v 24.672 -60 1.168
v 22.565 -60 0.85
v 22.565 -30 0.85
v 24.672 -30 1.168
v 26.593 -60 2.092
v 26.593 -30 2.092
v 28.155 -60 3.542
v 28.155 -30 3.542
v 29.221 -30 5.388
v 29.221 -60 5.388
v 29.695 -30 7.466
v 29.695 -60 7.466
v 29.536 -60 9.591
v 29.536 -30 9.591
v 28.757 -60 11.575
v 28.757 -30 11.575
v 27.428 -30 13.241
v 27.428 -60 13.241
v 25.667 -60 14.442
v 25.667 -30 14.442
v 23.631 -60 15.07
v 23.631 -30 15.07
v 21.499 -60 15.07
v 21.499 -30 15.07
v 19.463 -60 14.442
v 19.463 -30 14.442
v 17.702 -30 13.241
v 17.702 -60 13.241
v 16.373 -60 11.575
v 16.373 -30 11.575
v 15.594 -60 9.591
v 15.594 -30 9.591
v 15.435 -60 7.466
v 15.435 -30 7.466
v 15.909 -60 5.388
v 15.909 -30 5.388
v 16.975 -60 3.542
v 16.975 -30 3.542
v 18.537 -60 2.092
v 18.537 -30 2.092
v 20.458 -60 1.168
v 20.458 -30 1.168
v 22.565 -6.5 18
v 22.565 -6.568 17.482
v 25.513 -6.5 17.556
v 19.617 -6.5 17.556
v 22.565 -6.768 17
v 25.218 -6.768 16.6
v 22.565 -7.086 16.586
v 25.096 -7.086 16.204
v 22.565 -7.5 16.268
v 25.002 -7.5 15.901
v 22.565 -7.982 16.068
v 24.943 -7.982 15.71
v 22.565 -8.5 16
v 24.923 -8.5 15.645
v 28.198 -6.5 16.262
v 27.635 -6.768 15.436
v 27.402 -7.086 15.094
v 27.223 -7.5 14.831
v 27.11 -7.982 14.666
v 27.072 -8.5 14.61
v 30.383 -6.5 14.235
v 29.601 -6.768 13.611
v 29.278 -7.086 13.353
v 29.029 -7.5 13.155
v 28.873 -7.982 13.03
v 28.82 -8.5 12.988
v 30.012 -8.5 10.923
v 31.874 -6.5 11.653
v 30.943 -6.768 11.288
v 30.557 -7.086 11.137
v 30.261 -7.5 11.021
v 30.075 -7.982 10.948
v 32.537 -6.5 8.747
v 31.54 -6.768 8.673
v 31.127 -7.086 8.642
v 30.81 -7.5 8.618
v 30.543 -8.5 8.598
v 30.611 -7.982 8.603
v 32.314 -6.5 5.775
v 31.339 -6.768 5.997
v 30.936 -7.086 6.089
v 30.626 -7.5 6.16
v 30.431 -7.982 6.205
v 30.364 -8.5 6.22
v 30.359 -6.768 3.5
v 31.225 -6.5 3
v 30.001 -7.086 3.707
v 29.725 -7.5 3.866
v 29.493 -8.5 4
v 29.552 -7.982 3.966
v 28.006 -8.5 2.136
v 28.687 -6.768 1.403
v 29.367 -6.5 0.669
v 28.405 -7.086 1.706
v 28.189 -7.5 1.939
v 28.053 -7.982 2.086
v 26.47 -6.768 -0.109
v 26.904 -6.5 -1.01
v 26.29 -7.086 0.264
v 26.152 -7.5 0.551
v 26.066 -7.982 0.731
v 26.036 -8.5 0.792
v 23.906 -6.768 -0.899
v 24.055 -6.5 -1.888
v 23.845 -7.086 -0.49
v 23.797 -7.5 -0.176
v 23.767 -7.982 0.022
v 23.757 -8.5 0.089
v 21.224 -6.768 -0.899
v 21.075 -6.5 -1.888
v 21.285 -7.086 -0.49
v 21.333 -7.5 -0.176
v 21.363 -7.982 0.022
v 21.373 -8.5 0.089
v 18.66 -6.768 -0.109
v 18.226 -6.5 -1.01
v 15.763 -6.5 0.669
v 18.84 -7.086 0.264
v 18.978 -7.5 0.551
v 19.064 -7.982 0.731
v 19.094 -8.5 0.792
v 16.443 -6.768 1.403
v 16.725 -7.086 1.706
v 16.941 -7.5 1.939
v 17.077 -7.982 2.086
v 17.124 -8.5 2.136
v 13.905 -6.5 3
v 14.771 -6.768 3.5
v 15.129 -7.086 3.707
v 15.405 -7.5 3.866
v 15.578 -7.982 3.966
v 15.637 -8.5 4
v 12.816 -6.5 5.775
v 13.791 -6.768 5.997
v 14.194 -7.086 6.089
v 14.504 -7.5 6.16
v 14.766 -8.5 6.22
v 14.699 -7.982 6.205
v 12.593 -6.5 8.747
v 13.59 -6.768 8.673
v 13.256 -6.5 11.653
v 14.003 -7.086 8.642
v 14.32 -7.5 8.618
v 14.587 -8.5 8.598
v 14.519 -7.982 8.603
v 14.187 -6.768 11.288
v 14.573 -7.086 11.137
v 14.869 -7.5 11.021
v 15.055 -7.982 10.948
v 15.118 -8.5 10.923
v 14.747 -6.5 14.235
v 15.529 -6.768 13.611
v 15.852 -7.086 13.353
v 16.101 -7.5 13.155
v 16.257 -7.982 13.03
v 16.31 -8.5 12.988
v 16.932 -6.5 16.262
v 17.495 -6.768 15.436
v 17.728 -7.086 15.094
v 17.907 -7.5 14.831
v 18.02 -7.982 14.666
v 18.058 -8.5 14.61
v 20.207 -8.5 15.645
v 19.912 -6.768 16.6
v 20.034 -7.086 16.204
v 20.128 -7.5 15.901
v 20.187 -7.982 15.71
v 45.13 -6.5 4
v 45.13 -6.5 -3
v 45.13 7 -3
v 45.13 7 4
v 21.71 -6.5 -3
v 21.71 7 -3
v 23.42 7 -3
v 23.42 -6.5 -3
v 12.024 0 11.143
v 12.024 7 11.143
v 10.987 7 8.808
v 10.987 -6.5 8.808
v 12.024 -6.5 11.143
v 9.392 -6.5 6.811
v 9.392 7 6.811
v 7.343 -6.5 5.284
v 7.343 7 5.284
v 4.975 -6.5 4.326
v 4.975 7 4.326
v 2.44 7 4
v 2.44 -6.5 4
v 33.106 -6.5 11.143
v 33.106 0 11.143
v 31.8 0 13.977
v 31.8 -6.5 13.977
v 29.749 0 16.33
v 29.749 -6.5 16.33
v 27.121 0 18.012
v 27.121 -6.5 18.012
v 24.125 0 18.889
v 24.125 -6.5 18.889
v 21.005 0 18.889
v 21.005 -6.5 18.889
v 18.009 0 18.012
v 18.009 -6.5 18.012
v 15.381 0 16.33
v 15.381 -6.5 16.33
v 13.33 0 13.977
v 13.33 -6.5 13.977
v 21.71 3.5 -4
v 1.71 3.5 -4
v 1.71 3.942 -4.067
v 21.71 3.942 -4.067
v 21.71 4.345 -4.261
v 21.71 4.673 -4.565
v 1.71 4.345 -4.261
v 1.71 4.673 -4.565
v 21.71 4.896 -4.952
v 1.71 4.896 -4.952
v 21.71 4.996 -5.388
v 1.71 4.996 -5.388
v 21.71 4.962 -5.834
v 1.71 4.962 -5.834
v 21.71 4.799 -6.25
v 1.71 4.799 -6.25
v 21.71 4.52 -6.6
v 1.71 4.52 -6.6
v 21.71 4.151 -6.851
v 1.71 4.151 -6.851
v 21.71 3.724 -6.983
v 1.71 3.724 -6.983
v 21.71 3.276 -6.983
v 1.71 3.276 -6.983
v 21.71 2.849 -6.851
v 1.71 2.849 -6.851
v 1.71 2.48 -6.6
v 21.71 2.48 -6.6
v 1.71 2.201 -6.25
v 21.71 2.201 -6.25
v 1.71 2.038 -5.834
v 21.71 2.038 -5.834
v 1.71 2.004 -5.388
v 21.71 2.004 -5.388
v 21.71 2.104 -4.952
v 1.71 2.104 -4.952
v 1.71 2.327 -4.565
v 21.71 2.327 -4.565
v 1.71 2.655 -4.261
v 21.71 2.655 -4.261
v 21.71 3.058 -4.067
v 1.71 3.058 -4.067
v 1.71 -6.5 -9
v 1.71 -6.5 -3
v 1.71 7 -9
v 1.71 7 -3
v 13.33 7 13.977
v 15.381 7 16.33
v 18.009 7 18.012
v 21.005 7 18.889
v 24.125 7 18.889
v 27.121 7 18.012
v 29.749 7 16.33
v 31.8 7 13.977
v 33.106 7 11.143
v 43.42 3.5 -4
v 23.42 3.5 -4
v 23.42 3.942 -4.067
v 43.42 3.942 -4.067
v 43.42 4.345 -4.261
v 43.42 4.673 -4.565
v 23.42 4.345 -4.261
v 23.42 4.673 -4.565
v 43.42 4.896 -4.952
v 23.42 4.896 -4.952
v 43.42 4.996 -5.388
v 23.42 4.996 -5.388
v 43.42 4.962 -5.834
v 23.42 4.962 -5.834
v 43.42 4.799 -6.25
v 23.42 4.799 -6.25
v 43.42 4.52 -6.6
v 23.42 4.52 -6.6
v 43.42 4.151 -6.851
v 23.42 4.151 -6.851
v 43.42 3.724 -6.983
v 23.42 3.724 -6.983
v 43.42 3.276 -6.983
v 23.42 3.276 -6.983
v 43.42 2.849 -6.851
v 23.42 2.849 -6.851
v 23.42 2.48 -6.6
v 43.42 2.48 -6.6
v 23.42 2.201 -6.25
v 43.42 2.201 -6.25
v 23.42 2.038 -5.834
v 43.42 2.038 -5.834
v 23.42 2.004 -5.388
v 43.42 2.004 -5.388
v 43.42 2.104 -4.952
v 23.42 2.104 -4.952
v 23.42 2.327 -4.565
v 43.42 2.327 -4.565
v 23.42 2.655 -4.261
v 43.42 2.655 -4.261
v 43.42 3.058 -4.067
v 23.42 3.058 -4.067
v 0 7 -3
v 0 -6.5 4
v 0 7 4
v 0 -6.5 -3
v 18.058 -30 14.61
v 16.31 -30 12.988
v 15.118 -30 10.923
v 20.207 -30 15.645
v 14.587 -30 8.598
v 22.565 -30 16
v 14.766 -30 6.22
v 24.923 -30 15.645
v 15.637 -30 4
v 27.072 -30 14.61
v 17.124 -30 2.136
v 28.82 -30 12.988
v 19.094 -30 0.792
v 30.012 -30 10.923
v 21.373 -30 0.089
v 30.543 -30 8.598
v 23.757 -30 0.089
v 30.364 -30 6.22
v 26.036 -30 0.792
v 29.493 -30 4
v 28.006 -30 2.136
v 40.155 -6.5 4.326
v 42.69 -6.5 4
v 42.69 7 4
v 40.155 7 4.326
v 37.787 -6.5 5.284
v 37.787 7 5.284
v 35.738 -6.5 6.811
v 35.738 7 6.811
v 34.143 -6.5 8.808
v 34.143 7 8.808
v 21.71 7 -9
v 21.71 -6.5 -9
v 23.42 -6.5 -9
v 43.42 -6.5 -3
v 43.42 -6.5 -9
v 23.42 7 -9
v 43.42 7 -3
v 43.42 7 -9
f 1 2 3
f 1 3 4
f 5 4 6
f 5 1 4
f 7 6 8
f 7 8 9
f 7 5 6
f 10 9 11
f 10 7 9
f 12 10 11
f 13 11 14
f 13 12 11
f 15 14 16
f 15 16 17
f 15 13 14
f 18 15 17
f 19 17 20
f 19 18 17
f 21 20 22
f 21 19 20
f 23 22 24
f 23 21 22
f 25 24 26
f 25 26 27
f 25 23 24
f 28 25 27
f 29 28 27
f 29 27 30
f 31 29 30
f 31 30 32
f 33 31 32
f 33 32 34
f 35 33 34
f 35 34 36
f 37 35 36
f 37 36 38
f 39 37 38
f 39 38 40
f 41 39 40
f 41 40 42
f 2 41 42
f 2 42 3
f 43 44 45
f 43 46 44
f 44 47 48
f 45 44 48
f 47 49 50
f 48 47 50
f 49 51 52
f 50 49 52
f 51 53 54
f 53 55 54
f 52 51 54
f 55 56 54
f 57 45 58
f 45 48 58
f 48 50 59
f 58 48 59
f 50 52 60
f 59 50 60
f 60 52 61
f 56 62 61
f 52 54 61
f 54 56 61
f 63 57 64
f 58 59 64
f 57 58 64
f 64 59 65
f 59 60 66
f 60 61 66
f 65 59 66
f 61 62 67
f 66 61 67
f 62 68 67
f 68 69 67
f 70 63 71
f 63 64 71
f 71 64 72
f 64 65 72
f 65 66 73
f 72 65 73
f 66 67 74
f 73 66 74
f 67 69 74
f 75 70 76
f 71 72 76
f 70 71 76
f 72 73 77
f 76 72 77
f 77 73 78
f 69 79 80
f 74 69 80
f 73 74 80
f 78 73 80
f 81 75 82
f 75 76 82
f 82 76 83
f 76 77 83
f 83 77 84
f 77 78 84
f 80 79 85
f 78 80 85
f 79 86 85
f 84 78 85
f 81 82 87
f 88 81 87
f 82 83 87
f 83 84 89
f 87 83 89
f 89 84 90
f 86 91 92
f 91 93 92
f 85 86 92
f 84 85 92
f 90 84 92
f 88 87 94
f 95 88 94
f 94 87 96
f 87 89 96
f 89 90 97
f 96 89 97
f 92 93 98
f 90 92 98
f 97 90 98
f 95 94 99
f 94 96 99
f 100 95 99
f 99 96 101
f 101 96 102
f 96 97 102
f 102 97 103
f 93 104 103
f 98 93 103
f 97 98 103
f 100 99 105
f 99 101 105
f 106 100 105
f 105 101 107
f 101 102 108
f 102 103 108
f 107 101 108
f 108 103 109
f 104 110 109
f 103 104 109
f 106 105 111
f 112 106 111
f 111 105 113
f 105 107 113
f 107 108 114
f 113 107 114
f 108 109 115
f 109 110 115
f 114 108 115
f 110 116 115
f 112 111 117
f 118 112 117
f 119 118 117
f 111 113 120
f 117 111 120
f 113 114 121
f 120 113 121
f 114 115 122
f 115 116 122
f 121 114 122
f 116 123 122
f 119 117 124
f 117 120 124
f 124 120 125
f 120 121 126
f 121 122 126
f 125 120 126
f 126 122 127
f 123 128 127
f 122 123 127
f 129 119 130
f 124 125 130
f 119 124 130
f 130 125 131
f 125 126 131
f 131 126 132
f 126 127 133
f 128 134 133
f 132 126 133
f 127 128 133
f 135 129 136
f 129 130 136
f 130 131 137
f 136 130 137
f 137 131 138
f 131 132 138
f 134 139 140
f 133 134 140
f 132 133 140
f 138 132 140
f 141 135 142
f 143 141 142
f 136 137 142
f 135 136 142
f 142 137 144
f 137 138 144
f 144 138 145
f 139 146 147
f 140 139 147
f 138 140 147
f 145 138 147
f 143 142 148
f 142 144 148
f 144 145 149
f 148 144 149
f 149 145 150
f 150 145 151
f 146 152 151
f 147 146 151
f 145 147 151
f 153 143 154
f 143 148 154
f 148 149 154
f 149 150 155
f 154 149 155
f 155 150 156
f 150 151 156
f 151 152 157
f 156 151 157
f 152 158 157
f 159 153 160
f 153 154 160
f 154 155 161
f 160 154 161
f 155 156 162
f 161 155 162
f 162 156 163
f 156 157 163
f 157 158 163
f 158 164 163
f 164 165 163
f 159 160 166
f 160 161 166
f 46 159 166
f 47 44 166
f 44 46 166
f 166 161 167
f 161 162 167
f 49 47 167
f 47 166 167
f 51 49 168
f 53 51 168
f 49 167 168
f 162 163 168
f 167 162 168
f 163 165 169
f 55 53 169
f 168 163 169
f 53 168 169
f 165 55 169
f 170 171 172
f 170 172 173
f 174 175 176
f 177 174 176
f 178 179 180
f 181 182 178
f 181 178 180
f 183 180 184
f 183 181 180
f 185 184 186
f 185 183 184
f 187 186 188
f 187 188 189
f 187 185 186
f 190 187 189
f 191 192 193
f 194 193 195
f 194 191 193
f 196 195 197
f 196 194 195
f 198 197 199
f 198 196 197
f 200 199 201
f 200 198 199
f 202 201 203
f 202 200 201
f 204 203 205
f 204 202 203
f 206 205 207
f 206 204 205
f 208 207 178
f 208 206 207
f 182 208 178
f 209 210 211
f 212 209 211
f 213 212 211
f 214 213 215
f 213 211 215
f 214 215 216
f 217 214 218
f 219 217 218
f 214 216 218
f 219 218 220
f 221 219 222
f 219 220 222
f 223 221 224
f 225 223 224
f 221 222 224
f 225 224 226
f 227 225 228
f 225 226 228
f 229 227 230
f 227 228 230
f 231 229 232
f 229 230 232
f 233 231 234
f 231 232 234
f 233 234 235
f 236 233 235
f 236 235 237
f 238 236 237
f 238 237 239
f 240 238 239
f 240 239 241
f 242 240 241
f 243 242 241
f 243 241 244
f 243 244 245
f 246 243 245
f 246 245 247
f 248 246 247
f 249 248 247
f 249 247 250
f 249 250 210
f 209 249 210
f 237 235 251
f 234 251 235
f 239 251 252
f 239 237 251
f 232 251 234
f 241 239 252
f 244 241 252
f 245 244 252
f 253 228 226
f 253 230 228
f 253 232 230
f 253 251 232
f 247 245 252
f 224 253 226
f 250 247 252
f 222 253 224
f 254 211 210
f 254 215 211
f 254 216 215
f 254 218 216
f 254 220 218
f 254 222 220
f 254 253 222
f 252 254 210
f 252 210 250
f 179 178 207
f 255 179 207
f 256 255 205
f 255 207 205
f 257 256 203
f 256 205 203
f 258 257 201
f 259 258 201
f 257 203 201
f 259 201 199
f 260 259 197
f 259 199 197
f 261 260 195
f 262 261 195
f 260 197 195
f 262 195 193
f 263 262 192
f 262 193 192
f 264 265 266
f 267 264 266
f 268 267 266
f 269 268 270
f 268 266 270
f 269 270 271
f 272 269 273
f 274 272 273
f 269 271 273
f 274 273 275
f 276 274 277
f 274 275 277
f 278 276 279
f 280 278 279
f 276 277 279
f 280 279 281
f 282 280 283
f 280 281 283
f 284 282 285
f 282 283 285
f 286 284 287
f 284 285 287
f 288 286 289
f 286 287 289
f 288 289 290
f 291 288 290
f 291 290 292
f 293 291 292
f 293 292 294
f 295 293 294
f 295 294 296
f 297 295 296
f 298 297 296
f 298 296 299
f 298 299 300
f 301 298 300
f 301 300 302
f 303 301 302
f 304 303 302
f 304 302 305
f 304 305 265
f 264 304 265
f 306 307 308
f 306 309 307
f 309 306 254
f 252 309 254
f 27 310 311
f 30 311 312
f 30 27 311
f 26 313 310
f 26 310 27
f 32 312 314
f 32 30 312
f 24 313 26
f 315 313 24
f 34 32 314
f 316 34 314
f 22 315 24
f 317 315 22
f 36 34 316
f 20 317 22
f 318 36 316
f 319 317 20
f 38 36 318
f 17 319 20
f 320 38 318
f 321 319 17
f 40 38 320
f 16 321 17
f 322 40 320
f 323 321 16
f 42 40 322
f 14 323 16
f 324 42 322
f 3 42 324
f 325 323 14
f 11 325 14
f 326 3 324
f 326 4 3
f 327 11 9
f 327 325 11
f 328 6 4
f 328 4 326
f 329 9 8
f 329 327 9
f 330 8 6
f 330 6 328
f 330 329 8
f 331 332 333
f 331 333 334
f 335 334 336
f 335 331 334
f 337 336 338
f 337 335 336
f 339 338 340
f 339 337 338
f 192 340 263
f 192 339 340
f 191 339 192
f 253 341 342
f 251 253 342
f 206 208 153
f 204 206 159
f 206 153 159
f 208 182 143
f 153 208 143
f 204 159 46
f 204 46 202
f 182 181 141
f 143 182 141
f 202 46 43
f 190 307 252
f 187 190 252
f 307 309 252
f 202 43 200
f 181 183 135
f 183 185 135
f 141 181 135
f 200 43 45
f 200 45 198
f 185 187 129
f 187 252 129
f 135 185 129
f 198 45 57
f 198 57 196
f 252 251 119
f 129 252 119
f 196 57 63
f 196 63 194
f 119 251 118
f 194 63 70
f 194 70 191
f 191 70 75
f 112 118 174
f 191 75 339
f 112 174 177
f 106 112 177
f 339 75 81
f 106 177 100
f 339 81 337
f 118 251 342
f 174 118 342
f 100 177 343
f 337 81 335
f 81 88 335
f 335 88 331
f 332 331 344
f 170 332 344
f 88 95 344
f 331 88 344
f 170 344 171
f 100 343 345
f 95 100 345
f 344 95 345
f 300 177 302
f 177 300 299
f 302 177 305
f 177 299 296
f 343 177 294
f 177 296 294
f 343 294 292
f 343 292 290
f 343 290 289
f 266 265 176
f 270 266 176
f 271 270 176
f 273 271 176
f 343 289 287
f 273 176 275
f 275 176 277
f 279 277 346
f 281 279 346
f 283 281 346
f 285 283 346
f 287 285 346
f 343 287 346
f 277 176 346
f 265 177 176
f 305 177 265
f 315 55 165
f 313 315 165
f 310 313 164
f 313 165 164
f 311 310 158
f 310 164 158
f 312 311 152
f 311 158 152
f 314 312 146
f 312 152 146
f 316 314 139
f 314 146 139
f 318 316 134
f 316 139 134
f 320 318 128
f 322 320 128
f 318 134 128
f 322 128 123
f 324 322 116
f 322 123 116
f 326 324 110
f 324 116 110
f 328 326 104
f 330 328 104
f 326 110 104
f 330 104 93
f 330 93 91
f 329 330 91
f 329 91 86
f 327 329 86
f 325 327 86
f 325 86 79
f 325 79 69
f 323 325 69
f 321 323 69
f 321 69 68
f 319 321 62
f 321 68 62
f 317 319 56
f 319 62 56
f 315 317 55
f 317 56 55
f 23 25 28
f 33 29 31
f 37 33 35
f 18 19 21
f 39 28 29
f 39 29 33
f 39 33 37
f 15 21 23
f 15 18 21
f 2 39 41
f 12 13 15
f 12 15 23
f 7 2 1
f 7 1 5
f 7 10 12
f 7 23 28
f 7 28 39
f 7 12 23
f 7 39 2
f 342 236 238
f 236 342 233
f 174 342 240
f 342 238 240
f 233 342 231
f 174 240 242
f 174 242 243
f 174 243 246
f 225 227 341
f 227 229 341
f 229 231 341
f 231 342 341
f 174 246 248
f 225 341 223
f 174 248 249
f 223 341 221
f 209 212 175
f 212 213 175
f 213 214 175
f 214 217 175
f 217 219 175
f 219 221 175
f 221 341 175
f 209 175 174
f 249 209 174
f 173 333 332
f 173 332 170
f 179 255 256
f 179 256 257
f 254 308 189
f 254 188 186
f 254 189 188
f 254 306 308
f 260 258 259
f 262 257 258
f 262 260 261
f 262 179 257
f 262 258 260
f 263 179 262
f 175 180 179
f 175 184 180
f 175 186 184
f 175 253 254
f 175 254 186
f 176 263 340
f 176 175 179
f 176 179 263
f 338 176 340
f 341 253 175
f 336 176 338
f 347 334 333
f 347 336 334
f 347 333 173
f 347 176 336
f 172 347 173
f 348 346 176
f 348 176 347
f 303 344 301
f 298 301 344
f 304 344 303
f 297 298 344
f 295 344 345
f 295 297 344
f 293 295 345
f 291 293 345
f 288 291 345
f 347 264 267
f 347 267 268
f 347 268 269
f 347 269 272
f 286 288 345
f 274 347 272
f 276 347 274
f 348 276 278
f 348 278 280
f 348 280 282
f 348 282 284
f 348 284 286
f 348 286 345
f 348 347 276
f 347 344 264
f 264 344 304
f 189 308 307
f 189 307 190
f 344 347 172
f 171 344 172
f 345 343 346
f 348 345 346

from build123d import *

# Parameters (mm, degrees)
SKETCH1_R            = 11
SKETCH1_R_2          = 8
SKETCH1_W            = 45.13
SKETCH1_H            = 7
BOSS_EXTRUDE1_DEPTH  = 10
SKETCH2_W            = 1.71
SKETCH2_H            = 4
CUT_EXTRUDE1_DEPTH   = 10
SKETCH3_W            = 20
SKETCH3_H            = 10
BOSS_EXTRUDE2_DEPTH  = 3
CUT_EXTRUDE2_START   = -3
CUT_EXTRUDE2_DEPTH   = 3
SKETCH6_W            = 20
SKETCH6_H            = 7
BOSS_EXTRUDE3_DEPTH  = 2
SKETCH7_R            = 1.5
CUT_EXTRUDE5_DEPTH   = 44
SKETCH9_W            = 1.71
SKETCH9_H            = 7
BOSS_EXTRUDE4_DEPTH  = 3
CUT_EXTRUDE6_START   = -1
SKETCH11_R           = 8
CUT_EXTRUDE6_DEPTH   = 1
BOSS_EXTRUDE6_DEPTH  = 1
BOSS_EXTRUDE7_START  = 6
SKETCH13_R           = 8
BOSS_EXTRUDE7_DEPTH  = 6
SKETCH14_R           = 8
BOSS_EXTRUDE8_DEPTH  = 40
SKETCH15_R           = 7.5
BOSS_EXTRUDE9_DEPTH  = 30
BOSS_EXTRUDE10_START = 6.5
BOSS_EXTRUDE10_DEPTH = 6.5
SKETCH17_R           = 15.773418916
SKETCH17_R_2         = 7
CUT_EXTRUDE7_DEPTH   = 30
SKETCH18_R           = 7.1
BOSS_EXTRUDE11_DEPTH = 30
SKETCH19_R           = 7.2
BOSS_EXTRUDE12_DEPTH = 30
SKETCH20_R           = 12.810748173
SKETCH20_R_2         = 7.15
CUT_EXTRUDE8_DEPTH   = 30
SKETCH21_R           = 7.15
CUT_EXTRUDE9_DEPTH   = 10
SKETCH22_R           = 8
SKETCH22_R_2         = 7.15
CUT_EXTRUDE10_DEPTH  = 10
SKETCH25_W           = 1.71
SKETCH25_H           = 3
SKETCH25_W_2         = 20
CUT_EXTRUDE13_DEPTH  = 21
BOSS_EXTRUDE13_DEPTH = 20
BOSS_EXTRUDE14_START = -20
BOSS_EXTRUDE14_DEPTH = 20
SKETCH28_R           = 1.5
CUT_EXTRUDE14_DEPTH  = 50
SKETCH29_W           = 45.13
SKETCH29_H           = 13.5
BOSS_EXTRUDE15_DEPTH = 4
FILLET1_R            = 10
FILLET2_R            = 2


with BuildPart() as part:
    # Sketch1 → Boss-Extrude1 (new body)
    # profile 1 of 2: a face of its own
    with BuildSketch(Plane(origin=(0, 0, 0), x_dir=(1, 0, 0), z_dir=(0, 1, 0))):
        with Locations((22.565, -8)):
            Circle(SKETCH1_R)
        with Locations(Location((22.565, -8, 0), (0, 0, 270))):
            Circle(SKETCH1_R_2, mode=Mode.SUBTRACT)
    # profile 2 of 2: a face of its own
    with BuildSketch(Plane(origin=(0, 0, 0), x_dir=(1, 0, 0), z_dir=(0, 1, 0))):
        with Locations((22.565, 3.5)):
            Rectangle(SKETCH1_W, SKETCH1_H)
    extrude(amount=BOSS_EXTRUDE1_DEPTH)

    # Sketch2 → Cut-Extrude1 (cut)
    with BuildSketch(Plane(origin=(0, 10, 0), x_dir=(1, 0, 0), z_dir=(0, 1, 0))):
        with Locations((0.855, 5)):
            Rectangle(SKETCH2_W, SKETCH2_H)
        with Locations((22.565, 5)):
            Rectangle(SKETCH2_W, SKETCH2_H)
        with Locations((44.275, 5)):
            Rectangle(SKETCH2_W, SKETCH2_H)
    extrude(amount=-CUT_EXTRUDE1_DEPTH, mode=Mode.SUBTRACT)

    # Sketch3 → Boss-Extrude2 (add)
    with BuildSketch(Plane(origin=(0, 0, -7), x_dir=(-1, 0, 0), z_dir=(0, 0, -1))):
        with Locations((-33.42, 5)):
            Rectangle(SKETCH3_W, SKETCH3_H)
        with Locations((-11.71, 5)):
            Rectangle(SKETCH3_W, SKETCH3_H)
    extrude(amount=BOSS_EXTRUDE2_DEPTH)

    # Sketch4 → Cut-Extrude2 (cut)
    with BuildSketch(Plane(origin=(0, 10, 0), x_dir=(1, 0, 0), z_dir=(0, 1, 0)).offset(CUT_EXTRUDE2_START)):
        with BuildLine():
            Line((21.71, 3), (21.71, 10))
            Line((21.71, 10), (1.71, 10))
            Line((1.71, 10), (1.71, 3))
            Line((1.71, 3), (0, 3))
            Line((0, 3), (0, 0))
            Line((0, 0), (15.015165565, 0))
            ThreePointArc((15.015165565, 0), (22.565, -19), (30.114834435, 0))
            Line((30.114834435, 0), (45.13, 0))
            Line((45.13, 0), (45.13, 3))
            Line((45.13, 3), (43.42, 3))
            Line((43.42, 3), (43.42, 10))
            Line((43.42, 10), (23.42, 10))
            Line((23.42, 10), (23.42, 3))
            Line((23.42, 3), (21.71, 3))
        make_face()
    extrude(amount=CUT_EXTRUDE2_DEPTH, mode=Mode.SUBTRACT)

    # Sketch6 → Boss-Extrude3 (add)
    with BuildSketch(Plane(origin=(0, 0, -10), x_dir=(-1, 0, 0), z_dir=(0, 0, -1))):
        with Locations((-33.42, 3.5)):
            Rectangle(SKETCH6_W, SKETCH6_H)
        with Locations((-11.71, 3.5)):
            Rectangle(SKETCH6_W, SKETCH6_H)
    extrude(amount=BOSS_EXTRUDE3_DEPTH)

    # Sketch7 → Cut-Extrude5 (cut)
    with BuildSketch(Plane.ZY.offset(-1.71)):
        with Locations((-8.5, 3.5)):
            Circle(SKETCH7_R)
    extrude(amount=-CUT_EXTRUDE5_DEPTH, mode=Mode.SUBTRACT)

    # Sketch9 → Boss-Extrude4 (add)
    with BuildSketch(Plane(origin=(0, 0, -3), x_dir=(-1, 0, 0), z_dir=(0, 0, -1))):
        with Locations((-22.565, 3.5)):
            Rectangle(SKETCH9_W, SKETCH9_H)
        with Locations((-0.855, 3.5)):
            Rectangle(SKETCH9_W, SKETCH9_H)
        with Locations((-44.275, 3.5)):
            Rectangle(SKETCH9_W, SKETCH9_H)
    extrude(amount=BOSS_EXTRUDE4_DEPTH)

    # Sketch11 → Cut-Extrude6 (cut)
    with BuildSketch(Plane(origin=(0, 7, 0), x_dir=(1, 0, 0), z_dir=(0, 1, 0)).offset(CUT_EXTRUDE6_START)):
        with BuildLine():
            Line((45.13, 6), (43.42, 6))
            Line((43.42, 6), (43.42, 12))
            Line((43.42, 12), (23.42, 12))
            Line((23.42, 12), (23.42, 6))
            Line((23.42, 6), (21.71, 6))
            Line((21.71, 6), (21.71, 12))
            Line((21.71, 12), (1.71, 12))
            Line((1.71, 12), (1.71, 6))
            Line((1.71, 6), (0, 6))
            Line((0, 6), (0, 0))
            Line((0, 0), (15.015165565, 0))
            ThreePointArc((15.015165565, 0), (22.565, -19), (30.114834435, 0))
            Line((30.114834435, 0), (45.13, 0))
            Line((45.13, 0), (45.13, 6))
        make_face()
        with Locations(Location((22.565, -8, 0), (0, 0, 270))):
            Circle(SKETCH11_R, mode=Mode.SUBTRACT)
    extrude(amount=CUT_EXTRUDE6_DEPTH, mode=Mode.SUBTRACT)

    # Sketch12 → Boss-Extrude6 (add)
    with BuildSketch(Plane(origin=(0, 6, 0), x_dir=(1, 0, 0), z_dir=(0, 1, 0))):
        with BuildLine():
            Line((45.13, 0), (45.13, 6))
            Line((45.13, 6), (43.42, 6))
            Line((43.42, 6), (43.42, 12))
            Line((43.42, 12), (23.42, 12))
            Line((23.42, 12), (23.42, 6))
            Line((23.42, 6), (21.71, 6))
            Line((21.71, 6), (21.71, 12))
            Line((21.71, 12), (1.71, 12))
            Line((1.71, 12), (1.71, 6))
            Line((1.71, 6), (0, 6))
            Line((0, 6), (0, 0))
            Line((0, 0), (15.015165565, 0))
            ThreePointArc((15.015165565, 0), (22.565, -19), (30.114834435, 0))
            Line((30.114834435, 0), (45.13, 0))
        make_face()
    extrude(amount=BOSS_EXTRUDE6_DEPTH)

    # Sketch13 → Boss-Extrude7 (add)
    with BuildSketch(Plane.XZ.offset(-6).offset(BOSS_EXTRUDE7_START)):
        with Locations((22.565, 8)):
            Circle(SKETCH13_R)
    extrude(amount=-BOSS_EXTRUDE7_DEPTH)

    # Sketch14 → Boss-Extrude8 (add)
    with BuildSketch(Plane.XZ):
        with Locations(Location((22.565, 8, 0), (0, 0, 90))):
            Circle(SKETCH14_R)
    extrude(amount=BOSS_EXTRUDE8_DEPTH)

    # Sketch15 → Boss-Extrude9 (add)
    with BuildSketch(Plane.XZ.offset(40)):
        with Locations(Location((22.565, 8, 0), (0, 0, 270))):
            Circle(SKETCH15_R)
    extrude(amount=BOSS_EXTRUDE9_DEPTH)

    # Sketch16 → Boss-Extrude10 (add)
    with BuildSketch(Plane.XZ.offset(BOSS_EXTRUDE10_START)):
        with BuildLine():
            Line((43.42, -12), (43.42, -6))
            Line((43.42, -6), (45.13, -6))
            Line((45.13, -6), (45.13, 0))
            Line((45.13, 0), (30.114834435, 0))
            ThreePointArc((30.114834435, 0), (22.565, 19), (15.015165565, 0))
            Line((15.015165565, 0), (0, 0))
            Line((0, 0), (0, -6))
            Line((0, -6), (1.71, -6))
            Line((1.71, -6), (1.71, -12))
            Line((1.71, -12), (21.71, -12))
            Line((21.71, -12), (21.71, -6))
            Line((21.71, -6), (23.42, -6))
            Line((23.42, -6), (23.42, -12))
            Line((23.42, -12), (43.42, -12))
        make_face()
    extrude(amount=-BOSS_EXTRUDE10_DEPTH)

    # Sketch17 → Cut-Extrude7 (cut)
    with BuildSketch(Plane.XZ.offset(70)):
        with Locations((22.565, 8)):
            Circle(SKETCH17_R)
        with Locations(Location((22.565, 8, 0), (0, 0, 270))):
            Circle(SKETCH17_R_2, mode=Mode.SUBTRACT)
    extrude(amount=-CUT_EXTRUDE7_DEPTH, mode=Mode.SUBTRACT)

    # Sketch18 → Boss-Extrude11 (add)
    with BuildSketch(Plane.XZ.offset(70)):
        with Locations(Location((22.565, 8, 0), (0, 0, 270))):
            Circle(SKETCH18_R)
    extrude(amount=-BOSS_EXTRUDE11_DEPTH)

    # Sketch19 → Boss-Extrude12 (add)
    with BuildSketch(Plane.XZ.offset(70)):
        with Locations(Location((22.565, 8, 0), (0, 0, 270))):
            Circle(SKETCH19_R)
    extrude(amount=-BOSS_EXTRUDE12_DEPTH)

    # Sketch20 → Cut-Extrude8 (cut)
    with BuildSketch(Plane.XZ.offset(70)):
        with Locations((22.565, 8)):
            Circle(SKETCH20_R)
        with Locations(Location((22.565, 8, 0), (0, 0, 270))):
            Circle(SKETCH20_R_2, mode=Mode.SUBTRACT)
    extrude(amount=-CUT_EXTRUDE8_DEPTH, mode=Mode.SUBTRACT)

    # Sketch21 → Cut-Extrude9 (cut)
    with BuildSketch(Plane.XZ.offset(70)):
        with Locations(Location((22.565, 8, 0), (0, 0, 270))):
            Circle(SKETCH21_R)
    extrude(amount=-CUT_EXTRUDE9_DEPTH, mode=Mode.SUBTRACT)

    # Sketch22 → Cut-Extrude10 (cut)
    with BuildSketch(Plane.XZ.offset(40)):
        with Locations(Location((22.565, 8, 0), (0, 0, 270))):
            Circle(SKETCH22_R)
        with Locations(Location((22.565, 8, 0), (0, 0, 270))):
            Circle(SKETCH22_R_2, mode=Mode.SUBTRACT)
    extrude(amount=-CUT_EXTRUDE10_DEPTH, mode=Mode.SUBTRACT)

    # Sketch25 → Cut-Extrude13 (cut)
    with BuildSketch(Plane(origin=(0, 7, 0), x_dir=(1, 0, 0), z_dir=(0, 1, 0))):
        with Locations((0.855, 4.5)):
            Rectangle(SKETCH25_W, SKETCH25_H)
        with Locations((11.71, 10.5)):
            Rectangle(SKETCH25_W_2, SKETCH25_H)
        with Locations((33.42, 10.5)):
            Rectangle(SKETCH25_W_2, SKETCH25_H)
        with Locations((22.565, 4.5)):
            Rectangle(SKETCH25_W, SKETCH25_H)
        with Locations((44.275, 4.5)):
            Rectangle(SKETCH25_W, SKETCH25_H)
    extrude(amount=-CUT_EXTRUDE13_DEPTH, mode=Mode.SUBTRACT)

    # Sketch26 → Boss-Extrude13 (add)
    with BuildSketch(Plane.ZY.offset(-1.71)):
        with BuildLine():
            ThreePointArc((-7, 3.5), (-7.633974596, 4.724744871), (-9, 4.914213562))
            Line((-9, 4.914213562), (-9, 2.085786438))
            ThreePointArc((-9, 2.085786438), (-7.633974596, 2.275255129), (-7, 3.5))
        make_face()
    extrude(amount=-BOSS_EXTRUDE13_DEPTH)

    # Sketch27 → Boss-Extrude14 (add)
    with BuildSketch(Plane(origin=(43.42, 0, 0), x_dir=(0, 0, -1), z_dir=(1, 0, 0)).offset(BOSS_EXTRUDE14_START)):
        with BuildLine():
            Line((9, 2.085786438), (9, 4.914213562))
            ThreePointArc((9, 4.914213562), (7, 3.5), (9, 2.085786438))
        make_face()
    extrude(amount=BOSS_EXTRUDE14_DEPTH)

    # Sketch28 → Cut-Extrude14 (cut)
    with BuildSketch(Plane.ZY.offset(-1.71)):
        with Locations((-5.5, 3.5)):
            Circle(SKETCH28_R)
    extrude(amount=-CUT_EXTRUDE14_DEPTH, mode=Mode.SUBTRACT)

    # Sketch29 → Boss-Extrude15 (add)
    with BuildSketch(Plane.XY):
        with Locations((22.565, 0.25)):
            Rectangle(SKETCH29_W, SKETCH29_H)
    extrude(amount=BOSS_EXTRUDE15_DEPTH)

    # Fillet1
    fillet1_edges = [part.edges().sort_by_distance(p)[0] for p in [
        (32.811950766, 0.25, 4),
        (12.318049234, 0.25, 4),
    ]]
    fillet(fillet1_edges, radius=FILLET1_R)

    # Fillet2
    fillet2_edges = [part.edges().sort_by_distance(p)[0] for p in [
        (22.565, -6.5, 0),
    ]]
    fillet(fillet2_edges, radius=FILLET2_R)


solid = part.part
